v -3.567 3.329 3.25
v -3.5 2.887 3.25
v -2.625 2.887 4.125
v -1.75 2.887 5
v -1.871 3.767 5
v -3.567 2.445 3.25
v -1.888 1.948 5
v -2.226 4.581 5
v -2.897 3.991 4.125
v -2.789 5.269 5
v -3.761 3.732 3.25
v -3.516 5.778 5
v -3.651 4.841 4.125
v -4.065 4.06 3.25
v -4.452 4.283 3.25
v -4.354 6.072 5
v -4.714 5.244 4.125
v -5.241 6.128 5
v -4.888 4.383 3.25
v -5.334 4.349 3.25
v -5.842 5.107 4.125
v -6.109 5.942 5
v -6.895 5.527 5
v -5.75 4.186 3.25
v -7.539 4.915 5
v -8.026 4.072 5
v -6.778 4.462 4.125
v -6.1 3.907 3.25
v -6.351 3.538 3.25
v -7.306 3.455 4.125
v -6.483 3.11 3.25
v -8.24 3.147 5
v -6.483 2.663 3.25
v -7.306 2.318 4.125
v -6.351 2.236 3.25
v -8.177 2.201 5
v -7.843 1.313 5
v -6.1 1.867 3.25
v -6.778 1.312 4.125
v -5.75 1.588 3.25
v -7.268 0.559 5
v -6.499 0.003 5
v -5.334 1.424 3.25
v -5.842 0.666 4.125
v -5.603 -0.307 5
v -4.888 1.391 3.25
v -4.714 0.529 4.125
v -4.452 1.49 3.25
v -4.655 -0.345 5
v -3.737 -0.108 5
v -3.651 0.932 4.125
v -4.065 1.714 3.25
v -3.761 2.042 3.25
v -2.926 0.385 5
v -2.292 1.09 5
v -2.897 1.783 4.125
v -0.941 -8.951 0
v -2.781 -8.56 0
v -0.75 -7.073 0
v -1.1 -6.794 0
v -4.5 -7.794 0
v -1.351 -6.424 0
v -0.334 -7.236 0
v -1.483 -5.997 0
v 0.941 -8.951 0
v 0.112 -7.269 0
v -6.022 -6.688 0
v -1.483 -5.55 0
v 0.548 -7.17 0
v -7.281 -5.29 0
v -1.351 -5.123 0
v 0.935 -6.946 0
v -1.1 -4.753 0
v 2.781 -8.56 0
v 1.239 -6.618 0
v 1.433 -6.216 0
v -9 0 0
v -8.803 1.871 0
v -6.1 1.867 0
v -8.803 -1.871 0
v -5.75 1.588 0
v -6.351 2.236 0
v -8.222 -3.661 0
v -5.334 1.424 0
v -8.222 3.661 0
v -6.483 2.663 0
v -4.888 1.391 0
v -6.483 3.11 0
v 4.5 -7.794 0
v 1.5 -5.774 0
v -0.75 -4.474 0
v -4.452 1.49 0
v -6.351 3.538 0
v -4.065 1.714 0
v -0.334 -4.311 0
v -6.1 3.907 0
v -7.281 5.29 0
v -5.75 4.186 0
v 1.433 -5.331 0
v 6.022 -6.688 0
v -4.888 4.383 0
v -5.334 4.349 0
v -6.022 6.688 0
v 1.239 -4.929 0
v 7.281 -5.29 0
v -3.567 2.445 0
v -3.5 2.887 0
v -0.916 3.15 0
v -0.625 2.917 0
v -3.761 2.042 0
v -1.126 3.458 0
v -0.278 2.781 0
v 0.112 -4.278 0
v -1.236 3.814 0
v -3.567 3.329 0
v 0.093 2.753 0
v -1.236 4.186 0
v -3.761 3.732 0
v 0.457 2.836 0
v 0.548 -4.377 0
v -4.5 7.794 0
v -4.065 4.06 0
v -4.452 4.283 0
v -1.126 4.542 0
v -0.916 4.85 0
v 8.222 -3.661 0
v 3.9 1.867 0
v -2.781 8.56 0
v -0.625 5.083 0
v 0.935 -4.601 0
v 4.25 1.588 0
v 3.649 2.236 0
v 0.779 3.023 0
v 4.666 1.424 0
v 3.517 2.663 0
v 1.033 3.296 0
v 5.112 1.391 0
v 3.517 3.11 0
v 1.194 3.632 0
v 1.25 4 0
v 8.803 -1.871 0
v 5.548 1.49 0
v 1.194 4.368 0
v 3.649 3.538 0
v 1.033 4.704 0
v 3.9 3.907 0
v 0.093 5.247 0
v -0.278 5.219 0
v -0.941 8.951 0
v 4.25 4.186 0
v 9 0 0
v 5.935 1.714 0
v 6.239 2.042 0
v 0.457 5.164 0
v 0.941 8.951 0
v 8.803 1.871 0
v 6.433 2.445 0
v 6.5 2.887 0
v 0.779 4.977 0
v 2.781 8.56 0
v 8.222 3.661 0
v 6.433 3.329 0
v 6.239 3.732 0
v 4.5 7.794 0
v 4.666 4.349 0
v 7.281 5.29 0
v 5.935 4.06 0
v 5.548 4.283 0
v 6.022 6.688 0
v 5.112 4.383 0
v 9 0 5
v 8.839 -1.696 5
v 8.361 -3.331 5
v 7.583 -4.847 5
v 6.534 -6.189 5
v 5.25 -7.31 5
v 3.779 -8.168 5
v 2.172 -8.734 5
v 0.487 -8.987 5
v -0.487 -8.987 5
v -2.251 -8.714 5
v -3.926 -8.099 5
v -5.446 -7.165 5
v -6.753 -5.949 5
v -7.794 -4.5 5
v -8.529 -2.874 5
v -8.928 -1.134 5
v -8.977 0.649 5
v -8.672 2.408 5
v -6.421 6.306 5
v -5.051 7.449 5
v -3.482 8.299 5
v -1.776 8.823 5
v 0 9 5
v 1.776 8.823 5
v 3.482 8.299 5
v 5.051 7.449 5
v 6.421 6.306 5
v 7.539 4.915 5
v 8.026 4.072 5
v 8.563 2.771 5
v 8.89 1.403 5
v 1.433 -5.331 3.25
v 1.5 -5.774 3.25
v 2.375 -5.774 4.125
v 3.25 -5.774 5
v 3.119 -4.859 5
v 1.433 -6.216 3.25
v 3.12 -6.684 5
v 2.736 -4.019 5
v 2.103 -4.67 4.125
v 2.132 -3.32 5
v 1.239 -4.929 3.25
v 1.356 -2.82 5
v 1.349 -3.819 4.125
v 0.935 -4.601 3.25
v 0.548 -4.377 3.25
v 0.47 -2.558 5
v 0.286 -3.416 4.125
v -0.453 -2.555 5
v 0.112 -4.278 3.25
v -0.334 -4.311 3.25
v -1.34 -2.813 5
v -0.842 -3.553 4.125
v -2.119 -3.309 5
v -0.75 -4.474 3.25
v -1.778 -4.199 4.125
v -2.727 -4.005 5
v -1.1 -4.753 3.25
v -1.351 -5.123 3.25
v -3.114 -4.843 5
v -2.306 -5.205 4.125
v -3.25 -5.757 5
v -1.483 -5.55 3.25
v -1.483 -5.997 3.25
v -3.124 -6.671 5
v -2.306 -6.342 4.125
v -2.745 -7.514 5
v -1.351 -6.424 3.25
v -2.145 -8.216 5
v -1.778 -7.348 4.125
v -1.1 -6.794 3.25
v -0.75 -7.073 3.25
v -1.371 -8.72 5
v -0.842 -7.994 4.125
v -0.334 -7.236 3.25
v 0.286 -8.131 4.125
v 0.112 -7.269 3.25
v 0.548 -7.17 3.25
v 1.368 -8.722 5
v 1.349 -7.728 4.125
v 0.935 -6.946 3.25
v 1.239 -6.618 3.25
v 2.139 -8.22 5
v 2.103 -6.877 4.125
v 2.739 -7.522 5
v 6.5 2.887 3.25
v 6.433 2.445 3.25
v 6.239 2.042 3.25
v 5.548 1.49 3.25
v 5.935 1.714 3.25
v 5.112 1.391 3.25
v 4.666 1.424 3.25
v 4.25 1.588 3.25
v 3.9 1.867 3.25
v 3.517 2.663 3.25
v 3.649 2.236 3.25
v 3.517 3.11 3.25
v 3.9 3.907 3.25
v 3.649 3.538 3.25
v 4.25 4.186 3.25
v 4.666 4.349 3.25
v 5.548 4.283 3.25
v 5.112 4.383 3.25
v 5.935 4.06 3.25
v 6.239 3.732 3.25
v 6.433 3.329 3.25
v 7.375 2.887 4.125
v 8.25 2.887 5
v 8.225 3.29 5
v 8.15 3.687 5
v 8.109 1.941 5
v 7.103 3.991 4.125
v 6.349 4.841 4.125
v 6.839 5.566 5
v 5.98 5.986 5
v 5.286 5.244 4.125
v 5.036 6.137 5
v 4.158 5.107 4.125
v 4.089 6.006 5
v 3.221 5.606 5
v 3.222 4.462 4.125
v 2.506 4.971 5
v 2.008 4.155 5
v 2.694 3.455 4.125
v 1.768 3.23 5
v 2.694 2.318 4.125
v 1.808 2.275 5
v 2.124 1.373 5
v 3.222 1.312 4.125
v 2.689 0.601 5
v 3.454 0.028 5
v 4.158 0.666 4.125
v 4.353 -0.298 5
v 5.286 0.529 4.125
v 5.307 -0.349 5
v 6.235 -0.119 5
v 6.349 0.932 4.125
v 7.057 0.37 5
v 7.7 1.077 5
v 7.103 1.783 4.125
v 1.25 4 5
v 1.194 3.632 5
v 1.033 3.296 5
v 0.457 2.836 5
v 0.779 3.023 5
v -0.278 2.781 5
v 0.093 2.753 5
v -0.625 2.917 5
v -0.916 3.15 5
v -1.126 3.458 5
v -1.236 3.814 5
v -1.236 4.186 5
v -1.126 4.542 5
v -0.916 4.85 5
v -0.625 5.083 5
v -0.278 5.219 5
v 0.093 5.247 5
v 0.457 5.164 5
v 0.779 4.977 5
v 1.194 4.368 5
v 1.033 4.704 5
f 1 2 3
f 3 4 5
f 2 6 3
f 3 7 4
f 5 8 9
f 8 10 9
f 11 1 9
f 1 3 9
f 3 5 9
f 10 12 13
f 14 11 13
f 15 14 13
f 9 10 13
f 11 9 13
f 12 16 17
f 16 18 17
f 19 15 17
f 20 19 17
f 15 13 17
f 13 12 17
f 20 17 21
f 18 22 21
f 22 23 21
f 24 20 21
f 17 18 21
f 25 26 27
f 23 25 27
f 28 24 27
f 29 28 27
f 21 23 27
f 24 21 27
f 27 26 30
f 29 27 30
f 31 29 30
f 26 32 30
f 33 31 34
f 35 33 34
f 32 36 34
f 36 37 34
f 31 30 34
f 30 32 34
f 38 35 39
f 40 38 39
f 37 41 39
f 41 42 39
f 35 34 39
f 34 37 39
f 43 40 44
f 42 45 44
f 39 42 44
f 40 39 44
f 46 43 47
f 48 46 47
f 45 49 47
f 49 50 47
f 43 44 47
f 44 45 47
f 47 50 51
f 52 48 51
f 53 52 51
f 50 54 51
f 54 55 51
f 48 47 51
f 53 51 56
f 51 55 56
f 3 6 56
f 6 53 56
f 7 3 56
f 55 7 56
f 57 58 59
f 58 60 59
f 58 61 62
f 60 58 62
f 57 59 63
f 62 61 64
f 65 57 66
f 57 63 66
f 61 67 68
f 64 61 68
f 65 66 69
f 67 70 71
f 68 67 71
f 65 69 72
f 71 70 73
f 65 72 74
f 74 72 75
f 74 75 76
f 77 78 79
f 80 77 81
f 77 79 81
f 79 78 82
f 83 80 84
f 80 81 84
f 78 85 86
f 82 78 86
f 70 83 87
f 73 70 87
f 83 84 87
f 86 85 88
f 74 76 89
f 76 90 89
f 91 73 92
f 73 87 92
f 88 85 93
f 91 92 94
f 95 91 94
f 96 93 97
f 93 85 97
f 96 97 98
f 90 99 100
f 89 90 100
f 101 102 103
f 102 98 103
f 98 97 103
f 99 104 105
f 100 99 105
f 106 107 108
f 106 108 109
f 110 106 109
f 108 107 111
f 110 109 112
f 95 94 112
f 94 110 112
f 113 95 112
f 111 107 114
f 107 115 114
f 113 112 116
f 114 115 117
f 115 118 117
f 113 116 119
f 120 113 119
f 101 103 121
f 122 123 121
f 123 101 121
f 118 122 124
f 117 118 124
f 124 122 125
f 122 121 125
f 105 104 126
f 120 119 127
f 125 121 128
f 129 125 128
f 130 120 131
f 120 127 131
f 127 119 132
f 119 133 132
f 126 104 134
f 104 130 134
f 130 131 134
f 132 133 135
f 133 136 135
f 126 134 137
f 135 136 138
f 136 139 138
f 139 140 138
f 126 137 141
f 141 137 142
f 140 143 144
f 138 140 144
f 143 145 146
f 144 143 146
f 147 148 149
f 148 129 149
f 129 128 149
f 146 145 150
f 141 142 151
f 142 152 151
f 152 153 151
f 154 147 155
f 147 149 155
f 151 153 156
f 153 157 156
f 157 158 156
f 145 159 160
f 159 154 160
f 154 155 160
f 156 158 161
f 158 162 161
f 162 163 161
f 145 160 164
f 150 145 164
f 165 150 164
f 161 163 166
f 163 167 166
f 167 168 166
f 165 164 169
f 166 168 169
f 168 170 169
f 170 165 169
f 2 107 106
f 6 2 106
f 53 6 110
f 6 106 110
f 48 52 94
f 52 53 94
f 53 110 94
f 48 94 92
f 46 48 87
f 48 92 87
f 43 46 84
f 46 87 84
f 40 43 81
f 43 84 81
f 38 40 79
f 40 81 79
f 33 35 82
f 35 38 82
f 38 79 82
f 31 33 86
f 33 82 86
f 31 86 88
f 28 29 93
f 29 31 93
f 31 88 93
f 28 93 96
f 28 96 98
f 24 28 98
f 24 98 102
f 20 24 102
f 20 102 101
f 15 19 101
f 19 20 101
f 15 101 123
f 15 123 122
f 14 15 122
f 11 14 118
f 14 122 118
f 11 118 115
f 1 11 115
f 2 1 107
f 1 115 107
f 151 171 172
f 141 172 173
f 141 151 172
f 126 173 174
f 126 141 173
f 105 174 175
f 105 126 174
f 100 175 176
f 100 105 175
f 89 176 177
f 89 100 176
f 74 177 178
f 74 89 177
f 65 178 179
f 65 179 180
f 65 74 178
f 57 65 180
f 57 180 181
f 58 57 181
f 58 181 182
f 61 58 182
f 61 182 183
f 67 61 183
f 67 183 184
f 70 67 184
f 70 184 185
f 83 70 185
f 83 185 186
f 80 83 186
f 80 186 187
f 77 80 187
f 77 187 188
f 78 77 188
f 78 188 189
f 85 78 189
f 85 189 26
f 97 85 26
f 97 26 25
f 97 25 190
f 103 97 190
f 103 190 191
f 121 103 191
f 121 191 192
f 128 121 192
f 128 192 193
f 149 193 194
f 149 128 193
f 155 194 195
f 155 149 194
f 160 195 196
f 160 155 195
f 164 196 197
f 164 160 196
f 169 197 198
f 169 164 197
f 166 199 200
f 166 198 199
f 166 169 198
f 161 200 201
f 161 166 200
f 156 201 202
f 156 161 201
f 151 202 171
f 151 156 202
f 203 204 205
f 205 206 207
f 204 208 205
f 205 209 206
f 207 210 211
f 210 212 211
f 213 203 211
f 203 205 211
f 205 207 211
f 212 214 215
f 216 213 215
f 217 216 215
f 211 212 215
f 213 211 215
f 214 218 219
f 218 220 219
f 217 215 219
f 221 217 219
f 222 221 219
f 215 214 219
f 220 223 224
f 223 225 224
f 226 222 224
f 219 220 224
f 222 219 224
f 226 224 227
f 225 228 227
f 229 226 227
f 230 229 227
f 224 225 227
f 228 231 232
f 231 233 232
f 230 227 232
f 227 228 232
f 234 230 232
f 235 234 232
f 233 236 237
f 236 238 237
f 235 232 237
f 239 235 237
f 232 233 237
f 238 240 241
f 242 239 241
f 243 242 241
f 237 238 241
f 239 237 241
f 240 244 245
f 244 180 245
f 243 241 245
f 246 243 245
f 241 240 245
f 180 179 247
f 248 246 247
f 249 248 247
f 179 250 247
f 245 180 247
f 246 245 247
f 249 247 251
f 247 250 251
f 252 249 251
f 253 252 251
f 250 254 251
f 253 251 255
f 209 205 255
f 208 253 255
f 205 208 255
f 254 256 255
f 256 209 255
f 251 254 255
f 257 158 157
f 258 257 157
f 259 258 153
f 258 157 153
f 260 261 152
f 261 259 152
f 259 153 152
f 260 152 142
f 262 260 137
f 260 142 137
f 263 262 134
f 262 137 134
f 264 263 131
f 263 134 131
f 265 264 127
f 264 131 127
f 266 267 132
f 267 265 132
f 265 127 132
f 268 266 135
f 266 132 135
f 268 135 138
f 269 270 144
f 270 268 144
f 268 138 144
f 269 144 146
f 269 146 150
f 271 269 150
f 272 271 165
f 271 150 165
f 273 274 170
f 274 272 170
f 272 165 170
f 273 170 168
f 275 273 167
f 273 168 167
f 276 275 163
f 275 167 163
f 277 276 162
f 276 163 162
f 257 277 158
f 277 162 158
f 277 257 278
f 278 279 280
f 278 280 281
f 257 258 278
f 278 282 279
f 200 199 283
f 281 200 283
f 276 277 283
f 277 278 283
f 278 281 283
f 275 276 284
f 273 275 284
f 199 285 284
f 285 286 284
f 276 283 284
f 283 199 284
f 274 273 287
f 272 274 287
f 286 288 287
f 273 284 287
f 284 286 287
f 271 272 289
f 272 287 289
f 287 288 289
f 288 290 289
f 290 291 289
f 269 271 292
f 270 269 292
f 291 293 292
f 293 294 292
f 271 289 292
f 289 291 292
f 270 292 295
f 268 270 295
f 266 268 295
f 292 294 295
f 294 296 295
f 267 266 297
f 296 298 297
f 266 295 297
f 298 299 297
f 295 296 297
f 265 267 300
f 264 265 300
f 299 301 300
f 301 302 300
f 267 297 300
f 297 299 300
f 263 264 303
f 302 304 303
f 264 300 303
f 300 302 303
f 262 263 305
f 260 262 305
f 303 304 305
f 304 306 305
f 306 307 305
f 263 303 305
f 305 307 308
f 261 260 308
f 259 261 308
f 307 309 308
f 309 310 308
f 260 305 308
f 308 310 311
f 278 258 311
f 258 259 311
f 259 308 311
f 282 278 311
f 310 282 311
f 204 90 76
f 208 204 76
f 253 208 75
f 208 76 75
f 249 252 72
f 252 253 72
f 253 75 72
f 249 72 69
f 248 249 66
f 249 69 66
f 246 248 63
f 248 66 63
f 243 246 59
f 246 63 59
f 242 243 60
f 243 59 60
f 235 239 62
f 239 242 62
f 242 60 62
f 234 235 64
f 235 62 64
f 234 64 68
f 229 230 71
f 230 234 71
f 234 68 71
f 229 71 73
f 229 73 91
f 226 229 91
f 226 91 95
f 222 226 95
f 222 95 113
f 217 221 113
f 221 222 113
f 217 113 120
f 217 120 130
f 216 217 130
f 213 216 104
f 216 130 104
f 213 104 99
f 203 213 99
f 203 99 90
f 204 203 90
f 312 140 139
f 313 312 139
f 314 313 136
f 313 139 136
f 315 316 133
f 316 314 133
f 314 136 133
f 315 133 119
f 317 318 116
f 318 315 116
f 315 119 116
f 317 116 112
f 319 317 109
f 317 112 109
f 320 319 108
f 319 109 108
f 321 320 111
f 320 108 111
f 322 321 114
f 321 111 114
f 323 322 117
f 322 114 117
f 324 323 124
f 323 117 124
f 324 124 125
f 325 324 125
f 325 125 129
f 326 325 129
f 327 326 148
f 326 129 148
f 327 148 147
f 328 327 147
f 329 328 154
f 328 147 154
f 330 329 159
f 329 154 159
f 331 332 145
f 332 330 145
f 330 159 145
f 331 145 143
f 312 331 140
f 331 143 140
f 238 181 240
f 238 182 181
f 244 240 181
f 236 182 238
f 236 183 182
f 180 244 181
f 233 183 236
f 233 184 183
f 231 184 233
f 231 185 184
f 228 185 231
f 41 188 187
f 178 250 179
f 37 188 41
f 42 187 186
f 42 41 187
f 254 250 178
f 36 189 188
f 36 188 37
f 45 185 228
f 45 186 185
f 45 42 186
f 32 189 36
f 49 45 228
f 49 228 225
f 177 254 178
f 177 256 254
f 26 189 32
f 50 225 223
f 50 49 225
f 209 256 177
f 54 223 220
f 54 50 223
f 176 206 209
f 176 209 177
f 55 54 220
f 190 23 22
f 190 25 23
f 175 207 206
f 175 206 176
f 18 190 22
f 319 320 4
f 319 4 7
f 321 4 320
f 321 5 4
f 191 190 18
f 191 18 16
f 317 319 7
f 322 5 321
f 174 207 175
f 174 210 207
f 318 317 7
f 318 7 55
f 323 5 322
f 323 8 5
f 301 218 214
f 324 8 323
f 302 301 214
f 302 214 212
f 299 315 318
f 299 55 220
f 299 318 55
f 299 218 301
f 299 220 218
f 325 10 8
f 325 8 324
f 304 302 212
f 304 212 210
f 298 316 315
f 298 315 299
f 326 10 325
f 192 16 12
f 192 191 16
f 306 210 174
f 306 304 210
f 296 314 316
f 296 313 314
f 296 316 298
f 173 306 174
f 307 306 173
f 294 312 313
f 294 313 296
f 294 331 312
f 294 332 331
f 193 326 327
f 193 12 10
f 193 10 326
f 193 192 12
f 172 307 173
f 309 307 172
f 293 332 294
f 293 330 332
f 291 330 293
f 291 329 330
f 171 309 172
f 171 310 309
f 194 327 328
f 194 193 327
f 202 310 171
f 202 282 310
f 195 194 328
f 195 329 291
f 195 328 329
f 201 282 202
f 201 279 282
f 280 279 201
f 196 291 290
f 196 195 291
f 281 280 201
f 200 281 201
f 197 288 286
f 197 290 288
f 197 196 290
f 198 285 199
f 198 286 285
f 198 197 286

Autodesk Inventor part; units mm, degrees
ref_plane "YZ Plane" through (0, 0, 0) normal (1, 0, 0) x (0, 1, 0)
ref_plane "XZ Plane" through (0, 0, 0) normal (0, 1, 0) x (-1, 0, 0)
ref_plane "XY Plane" through (0, 0, 0) normal (0, 0, 1) x (1, 0, 0)
sketch "スケッチ1" plane through (0, 0, 0) normal (0, 0, 1) x (1, 0, 0)
  circle A0 centre (0, 0) radius 9
  line L0 (-5, 2.8868) -> (5, 2.8868) construction
  line L1 (5, 2.8868) -> (0, -5.7735) construction
  line L2 (0, -5.7735) -> (-5, 2.8868) construction
  circle A1 centre (-5, 2.8868) radius 1.5
  circle A2 centre (5, 2.8868) radius 1.5
  circle A3 centre (0, -5.7735) radius 1.5
  circle A4 centre (0, 4) radius 1.25
  line L3 (0, 0) -> (0, 4) construction
  dimension "d0" = 18
  dimension "d1" = 10
  dimension "d2" = 3
  dimension "d3" = 3
  dimension "d4" = 3
  dimension "d5" = 2.5
  dimension "d6" = 4
extrude "押し出し1" add sketch "スケッチ1" along normal blind 5
chamfer "面取り1" distance 1.75 angle 45 3 edges at (-6.5, 2.8868, 5) (3.5, 2.8868, 5) (-1.5, -5.7735, 5)
properties part number "横回転最終段カム"
